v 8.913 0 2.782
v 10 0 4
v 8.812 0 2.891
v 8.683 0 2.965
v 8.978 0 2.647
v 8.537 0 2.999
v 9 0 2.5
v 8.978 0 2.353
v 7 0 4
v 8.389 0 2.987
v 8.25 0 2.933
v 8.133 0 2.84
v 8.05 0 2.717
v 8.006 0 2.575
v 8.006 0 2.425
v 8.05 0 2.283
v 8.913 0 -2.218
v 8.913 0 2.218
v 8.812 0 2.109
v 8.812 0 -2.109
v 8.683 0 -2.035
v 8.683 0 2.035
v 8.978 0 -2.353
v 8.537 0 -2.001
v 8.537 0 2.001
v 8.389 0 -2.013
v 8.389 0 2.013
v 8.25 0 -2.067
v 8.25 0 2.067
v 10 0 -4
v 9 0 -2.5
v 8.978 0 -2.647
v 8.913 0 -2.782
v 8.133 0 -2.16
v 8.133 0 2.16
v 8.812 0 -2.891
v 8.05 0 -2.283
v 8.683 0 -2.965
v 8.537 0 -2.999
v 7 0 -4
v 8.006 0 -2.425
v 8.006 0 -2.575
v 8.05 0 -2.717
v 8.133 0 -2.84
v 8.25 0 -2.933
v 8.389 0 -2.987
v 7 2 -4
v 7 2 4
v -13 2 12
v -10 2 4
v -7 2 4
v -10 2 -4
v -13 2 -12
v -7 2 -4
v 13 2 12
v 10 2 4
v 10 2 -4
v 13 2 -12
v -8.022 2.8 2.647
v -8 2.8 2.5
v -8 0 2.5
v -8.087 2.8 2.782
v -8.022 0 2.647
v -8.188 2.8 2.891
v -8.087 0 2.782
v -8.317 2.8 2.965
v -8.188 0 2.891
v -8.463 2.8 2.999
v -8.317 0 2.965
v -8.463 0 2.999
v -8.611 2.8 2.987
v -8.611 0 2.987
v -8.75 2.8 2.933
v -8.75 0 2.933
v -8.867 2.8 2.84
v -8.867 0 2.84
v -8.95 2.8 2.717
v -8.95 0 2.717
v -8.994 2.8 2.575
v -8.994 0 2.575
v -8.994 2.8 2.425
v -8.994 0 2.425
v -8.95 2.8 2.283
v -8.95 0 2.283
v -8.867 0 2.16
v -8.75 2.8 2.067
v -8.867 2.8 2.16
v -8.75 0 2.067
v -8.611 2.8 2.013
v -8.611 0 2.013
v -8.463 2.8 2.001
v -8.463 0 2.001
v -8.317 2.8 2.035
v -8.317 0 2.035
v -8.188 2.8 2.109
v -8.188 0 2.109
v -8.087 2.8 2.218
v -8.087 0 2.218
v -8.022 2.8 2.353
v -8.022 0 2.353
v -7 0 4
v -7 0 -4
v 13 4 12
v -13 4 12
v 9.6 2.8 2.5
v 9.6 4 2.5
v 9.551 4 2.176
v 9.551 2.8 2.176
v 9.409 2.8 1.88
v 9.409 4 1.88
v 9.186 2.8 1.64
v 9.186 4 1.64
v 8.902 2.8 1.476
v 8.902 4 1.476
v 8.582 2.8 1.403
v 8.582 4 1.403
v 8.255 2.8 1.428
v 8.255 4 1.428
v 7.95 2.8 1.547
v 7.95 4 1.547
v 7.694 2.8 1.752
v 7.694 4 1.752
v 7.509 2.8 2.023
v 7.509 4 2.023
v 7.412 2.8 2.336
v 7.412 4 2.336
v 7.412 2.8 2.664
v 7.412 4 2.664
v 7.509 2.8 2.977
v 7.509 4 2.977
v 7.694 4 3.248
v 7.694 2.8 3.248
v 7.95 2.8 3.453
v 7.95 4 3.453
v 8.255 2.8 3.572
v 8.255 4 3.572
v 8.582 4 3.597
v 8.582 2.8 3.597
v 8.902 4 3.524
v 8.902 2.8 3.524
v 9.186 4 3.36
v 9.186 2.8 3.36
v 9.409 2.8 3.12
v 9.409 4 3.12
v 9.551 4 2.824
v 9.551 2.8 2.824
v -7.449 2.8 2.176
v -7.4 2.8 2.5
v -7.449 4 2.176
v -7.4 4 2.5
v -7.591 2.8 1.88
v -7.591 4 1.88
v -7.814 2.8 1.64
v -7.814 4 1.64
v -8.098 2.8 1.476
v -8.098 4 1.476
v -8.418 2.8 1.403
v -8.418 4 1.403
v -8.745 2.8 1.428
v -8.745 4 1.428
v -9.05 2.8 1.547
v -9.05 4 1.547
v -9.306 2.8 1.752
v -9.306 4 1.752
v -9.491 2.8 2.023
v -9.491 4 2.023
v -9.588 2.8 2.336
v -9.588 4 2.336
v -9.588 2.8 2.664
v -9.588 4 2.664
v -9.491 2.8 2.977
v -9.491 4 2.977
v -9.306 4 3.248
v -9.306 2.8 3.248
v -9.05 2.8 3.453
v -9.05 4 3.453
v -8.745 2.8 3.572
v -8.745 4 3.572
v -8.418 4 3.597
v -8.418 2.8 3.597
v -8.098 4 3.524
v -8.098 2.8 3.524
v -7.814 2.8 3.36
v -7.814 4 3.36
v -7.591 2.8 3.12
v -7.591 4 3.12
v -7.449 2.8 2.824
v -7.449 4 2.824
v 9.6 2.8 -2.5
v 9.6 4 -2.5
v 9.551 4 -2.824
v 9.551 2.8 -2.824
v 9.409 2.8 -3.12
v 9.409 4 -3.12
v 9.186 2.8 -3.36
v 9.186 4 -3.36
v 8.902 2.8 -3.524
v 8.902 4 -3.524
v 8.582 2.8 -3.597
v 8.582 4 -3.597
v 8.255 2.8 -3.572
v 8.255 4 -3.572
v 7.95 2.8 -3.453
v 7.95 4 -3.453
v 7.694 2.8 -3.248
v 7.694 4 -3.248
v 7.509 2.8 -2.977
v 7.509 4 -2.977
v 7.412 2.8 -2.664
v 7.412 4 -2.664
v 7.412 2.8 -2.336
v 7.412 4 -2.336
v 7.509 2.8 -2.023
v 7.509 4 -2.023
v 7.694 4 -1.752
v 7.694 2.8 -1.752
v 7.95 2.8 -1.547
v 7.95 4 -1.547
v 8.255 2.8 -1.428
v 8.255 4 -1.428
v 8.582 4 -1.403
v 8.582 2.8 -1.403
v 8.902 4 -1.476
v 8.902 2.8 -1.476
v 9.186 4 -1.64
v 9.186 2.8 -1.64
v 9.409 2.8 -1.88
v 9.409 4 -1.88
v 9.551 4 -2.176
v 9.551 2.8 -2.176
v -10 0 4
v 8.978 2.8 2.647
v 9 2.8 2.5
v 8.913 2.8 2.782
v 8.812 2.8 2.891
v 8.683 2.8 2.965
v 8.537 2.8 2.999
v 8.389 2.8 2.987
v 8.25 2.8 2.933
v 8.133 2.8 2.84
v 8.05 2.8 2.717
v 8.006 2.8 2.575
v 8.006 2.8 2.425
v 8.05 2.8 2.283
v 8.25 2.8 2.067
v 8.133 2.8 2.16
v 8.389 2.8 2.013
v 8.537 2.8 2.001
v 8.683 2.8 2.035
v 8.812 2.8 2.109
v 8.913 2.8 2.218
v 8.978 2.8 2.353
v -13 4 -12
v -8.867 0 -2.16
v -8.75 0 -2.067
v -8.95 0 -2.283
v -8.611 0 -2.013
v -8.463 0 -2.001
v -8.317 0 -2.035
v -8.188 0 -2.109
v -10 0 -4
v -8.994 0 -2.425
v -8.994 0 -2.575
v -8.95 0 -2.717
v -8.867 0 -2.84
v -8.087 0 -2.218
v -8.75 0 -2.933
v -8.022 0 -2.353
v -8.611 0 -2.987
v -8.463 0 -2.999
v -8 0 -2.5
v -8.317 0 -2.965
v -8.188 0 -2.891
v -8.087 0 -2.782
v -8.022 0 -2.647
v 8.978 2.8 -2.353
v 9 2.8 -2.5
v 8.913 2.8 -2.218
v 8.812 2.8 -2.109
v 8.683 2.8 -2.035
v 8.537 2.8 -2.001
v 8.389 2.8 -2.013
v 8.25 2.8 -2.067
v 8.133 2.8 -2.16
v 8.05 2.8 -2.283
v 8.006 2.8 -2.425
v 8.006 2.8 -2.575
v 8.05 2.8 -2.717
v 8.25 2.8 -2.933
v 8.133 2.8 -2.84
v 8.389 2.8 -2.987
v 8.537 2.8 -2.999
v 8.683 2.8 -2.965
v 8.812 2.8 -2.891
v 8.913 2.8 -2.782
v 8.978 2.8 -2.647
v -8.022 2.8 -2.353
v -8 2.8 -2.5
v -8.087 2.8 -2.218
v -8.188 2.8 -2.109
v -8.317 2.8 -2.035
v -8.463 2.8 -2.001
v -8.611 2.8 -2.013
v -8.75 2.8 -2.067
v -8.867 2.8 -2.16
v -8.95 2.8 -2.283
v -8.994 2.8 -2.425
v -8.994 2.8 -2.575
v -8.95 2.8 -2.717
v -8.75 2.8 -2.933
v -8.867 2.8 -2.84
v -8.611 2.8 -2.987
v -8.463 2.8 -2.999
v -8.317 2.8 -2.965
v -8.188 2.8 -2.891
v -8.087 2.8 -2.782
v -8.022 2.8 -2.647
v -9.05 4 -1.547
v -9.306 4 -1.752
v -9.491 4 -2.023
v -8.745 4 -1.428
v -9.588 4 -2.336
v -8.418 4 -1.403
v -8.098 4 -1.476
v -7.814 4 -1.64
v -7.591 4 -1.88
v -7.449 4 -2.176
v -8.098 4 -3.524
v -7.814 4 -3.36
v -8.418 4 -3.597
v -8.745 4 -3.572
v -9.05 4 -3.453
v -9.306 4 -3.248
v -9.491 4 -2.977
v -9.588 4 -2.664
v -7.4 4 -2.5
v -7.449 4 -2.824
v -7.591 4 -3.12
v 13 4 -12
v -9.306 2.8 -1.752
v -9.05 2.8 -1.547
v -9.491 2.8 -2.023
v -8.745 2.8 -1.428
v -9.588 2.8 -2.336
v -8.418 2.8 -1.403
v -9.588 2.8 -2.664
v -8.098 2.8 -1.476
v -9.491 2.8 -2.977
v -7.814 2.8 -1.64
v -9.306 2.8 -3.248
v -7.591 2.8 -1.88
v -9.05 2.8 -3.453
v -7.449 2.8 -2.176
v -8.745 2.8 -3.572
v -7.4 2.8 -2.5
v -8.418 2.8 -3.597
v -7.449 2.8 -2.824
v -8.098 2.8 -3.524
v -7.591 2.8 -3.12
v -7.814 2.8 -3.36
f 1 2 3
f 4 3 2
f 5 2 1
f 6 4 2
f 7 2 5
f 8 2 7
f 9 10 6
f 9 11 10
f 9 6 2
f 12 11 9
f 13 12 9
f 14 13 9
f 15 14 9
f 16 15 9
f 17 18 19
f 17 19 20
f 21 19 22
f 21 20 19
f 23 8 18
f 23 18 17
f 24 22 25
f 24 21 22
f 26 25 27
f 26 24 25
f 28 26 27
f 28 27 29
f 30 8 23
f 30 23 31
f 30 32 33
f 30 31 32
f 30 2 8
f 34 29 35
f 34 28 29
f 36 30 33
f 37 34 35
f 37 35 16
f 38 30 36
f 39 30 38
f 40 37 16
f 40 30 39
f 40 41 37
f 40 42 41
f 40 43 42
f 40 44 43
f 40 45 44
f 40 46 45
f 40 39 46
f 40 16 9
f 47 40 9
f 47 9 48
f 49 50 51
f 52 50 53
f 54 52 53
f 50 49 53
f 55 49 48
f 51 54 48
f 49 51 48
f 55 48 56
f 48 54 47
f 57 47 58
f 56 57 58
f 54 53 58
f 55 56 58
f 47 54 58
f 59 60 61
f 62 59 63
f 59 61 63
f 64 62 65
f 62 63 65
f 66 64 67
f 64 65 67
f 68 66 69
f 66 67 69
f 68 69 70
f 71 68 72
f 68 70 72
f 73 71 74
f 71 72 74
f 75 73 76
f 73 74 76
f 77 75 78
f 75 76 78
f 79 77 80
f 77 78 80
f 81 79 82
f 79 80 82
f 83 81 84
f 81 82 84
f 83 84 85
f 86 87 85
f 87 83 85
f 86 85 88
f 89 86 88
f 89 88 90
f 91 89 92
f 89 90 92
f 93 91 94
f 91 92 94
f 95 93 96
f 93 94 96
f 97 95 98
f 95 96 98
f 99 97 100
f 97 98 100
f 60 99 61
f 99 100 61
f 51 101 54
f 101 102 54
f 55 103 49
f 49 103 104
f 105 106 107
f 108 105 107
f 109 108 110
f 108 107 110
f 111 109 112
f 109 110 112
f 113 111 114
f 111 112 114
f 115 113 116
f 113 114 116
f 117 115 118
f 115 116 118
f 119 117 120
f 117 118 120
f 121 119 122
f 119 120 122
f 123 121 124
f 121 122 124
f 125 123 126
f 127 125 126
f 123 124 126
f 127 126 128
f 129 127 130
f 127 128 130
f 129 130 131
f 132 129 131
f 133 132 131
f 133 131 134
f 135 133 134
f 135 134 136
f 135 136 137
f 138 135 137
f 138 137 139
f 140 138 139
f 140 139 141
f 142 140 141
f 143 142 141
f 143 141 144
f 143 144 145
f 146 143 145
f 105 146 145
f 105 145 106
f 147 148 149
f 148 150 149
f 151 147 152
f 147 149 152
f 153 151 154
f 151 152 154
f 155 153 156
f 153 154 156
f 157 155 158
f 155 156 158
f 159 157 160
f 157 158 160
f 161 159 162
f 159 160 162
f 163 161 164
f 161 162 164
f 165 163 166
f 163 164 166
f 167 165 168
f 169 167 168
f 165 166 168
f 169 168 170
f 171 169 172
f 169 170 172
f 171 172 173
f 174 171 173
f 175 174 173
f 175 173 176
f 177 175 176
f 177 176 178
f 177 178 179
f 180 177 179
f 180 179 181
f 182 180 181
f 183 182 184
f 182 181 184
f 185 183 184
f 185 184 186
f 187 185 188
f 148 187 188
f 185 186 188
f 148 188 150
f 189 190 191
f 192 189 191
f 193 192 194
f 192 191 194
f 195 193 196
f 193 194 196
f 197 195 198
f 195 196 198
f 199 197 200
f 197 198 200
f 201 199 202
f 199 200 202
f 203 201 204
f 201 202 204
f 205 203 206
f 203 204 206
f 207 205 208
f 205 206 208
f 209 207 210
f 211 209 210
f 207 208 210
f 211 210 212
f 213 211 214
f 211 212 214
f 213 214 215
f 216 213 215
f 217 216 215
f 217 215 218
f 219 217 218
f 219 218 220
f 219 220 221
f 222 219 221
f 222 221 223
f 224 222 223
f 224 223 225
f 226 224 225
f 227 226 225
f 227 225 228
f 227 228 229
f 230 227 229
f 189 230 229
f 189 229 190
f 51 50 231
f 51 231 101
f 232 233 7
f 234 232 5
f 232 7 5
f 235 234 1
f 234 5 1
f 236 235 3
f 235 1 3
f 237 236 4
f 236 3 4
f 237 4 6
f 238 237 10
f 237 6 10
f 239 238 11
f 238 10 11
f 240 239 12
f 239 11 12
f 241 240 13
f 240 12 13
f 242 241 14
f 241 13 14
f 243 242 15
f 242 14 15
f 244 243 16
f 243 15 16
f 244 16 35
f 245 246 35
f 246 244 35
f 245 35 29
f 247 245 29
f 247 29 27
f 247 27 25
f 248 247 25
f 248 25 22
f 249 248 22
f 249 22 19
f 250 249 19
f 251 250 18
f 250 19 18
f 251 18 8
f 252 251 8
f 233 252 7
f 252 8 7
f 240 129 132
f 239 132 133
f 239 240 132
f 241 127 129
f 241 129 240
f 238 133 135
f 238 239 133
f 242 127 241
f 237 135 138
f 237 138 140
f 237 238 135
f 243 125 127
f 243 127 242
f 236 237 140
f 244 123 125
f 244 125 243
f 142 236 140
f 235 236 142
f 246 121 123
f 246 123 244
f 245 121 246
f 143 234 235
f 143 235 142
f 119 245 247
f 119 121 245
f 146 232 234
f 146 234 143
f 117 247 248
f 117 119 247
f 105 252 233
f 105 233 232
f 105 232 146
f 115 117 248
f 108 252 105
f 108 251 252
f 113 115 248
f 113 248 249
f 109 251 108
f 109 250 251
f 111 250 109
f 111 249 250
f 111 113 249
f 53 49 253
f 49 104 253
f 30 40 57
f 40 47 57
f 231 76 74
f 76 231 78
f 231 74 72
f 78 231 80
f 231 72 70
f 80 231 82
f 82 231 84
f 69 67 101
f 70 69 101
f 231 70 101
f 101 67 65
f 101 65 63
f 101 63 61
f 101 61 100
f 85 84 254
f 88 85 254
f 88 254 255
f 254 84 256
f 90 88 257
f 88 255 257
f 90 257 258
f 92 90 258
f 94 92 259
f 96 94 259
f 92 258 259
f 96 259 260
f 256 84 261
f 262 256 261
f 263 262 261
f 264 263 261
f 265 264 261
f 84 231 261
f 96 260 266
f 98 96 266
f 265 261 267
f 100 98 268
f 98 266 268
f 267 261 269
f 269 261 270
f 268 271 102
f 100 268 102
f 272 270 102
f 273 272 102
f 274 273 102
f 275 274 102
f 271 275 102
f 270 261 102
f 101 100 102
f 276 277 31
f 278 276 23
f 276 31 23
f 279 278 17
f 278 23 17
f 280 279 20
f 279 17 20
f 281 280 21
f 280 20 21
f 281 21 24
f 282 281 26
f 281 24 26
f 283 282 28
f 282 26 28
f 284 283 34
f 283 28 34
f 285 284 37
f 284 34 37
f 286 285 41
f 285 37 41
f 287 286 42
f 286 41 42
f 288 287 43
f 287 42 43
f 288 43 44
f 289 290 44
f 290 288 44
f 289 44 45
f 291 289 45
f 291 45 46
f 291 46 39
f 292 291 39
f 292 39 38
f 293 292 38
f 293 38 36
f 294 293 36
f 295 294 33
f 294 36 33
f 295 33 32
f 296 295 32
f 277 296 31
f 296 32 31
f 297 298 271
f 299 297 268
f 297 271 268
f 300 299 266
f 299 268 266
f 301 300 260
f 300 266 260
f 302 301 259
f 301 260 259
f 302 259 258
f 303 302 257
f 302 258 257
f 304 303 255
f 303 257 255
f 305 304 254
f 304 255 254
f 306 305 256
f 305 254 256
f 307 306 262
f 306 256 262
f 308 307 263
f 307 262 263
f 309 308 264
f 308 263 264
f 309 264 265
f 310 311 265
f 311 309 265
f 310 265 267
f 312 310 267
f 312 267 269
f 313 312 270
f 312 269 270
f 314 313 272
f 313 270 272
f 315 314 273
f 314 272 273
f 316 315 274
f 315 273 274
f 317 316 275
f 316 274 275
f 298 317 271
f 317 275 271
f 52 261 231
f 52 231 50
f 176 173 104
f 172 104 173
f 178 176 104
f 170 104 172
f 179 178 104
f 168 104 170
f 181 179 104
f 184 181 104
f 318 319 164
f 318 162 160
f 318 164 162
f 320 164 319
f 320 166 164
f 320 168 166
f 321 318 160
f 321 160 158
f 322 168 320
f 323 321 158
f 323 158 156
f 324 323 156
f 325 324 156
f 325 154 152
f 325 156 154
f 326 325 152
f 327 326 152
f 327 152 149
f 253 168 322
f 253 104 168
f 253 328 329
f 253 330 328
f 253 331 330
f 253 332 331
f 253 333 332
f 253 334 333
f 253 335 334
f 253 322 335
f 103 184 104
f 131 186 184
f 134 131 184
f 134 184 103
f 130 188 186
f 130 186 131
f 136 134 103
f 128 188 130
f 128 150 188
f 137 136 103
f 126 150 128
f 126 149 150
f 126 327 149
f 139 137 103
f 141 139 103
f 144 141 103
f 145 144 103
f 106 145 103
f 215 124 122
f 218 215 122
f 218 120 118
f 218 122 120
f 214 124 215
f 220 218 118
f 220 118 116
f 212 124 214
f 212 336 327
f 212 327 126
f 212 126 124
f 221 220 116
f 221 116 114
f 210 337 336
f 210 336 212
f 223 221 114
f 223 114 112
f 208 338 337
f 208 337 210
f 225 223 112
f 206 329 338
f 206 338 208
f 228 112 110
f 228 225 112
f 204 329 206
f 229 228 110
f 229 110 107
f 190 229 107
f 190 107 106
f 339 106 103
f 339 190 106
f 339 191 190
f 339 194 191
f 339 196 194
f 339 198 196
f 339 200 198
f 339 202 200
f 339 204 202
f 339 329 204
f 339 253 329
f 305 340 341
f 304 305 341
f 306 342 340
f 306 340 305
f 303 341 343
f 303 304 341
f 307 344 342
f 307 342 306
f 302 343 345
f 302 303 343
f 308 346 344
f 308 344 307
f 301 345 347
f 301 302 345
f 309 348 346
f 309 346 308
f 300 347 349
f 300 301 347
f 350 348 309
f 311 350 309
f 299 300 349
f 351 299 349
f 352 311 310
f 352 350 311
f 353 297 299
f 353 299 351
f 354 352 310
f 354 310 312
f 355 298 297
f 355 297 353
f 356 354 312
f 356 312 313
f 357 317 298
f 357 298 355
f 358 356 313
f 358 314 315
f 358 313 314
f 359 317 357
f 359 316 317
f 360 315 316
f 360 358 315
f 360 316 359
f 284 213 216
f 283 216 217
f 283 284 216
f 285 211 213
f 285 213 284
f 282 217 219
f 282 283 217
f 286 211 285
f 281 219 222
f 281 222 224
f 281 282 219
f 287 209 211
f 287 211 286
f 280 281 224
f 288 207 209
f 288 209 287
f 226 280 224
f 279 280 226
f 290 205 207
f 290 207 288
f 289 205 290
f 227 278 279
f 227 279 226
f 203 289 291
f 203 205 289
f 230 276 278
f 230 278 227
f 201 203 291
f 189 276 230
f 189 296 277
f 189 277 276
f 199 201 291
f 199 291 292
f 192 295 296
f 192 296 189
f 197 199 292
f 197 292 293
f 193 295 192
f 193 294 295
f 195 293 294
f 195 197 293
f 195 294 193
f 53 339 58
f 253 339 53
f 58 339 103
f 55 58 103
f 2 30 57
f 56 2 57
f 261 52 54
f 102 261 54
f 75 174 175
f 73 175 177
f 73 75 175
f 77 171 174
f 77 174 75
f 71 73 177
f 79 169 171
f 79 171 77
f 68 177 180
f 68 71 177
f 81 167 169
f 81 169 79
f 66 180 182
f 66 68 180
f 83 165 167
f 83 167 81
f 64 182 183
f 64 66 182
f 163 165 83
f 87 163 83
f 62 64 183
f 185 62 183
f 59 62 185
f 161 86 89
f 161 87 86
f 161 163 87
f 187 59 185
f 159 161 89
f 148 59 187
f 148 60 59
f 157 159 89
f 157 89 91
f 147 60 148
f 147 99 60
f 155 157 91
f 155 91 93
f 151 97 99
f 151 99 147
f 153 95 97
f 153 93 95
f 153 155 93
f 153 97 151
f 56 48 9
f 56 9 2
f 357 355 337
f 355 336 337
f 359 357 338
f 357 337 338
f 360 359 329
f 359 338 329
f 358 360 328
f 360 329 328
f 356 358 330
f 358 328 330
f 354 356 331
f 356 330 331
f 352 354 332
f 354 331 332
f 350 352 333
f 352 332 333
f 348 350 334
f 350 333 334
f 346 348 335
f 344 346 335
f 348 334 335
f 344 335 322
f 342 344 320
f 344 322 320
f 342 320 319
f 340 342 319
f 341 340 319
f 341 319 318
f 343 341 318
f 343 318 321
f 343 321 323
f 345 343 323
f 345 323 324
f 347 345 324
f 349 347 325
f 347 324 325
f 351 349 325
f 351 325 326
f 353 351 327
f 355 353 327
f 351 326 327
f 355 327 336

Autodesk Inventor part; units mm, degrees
ref_plane "YZ Plane" through (0, 0, 0) normal (1, 0, 0) x (0, 1, 0)
ref_plane "XZ Plane" through (0, 0, 0) normal (0, 1, 0) x (-1, 0, 0)
ref_plane "XY Plane" through (0, 0, 0) normal (0, 0, 1) x (1, 0, 0)
sketch "Sketch1" plane through (0, 0, 0) normal (0, 0, 1) x (1, 0, 0)
  line L0 (0, 0) -> (10, 0) construction
  line L1 (0, 0) -> (0, 21.2479) construction
  line L2 (10, 0) -> (7, 0)
  line L3 (7, 0) -> (7, 2)
  line L4 (7, 2) -> (0, 2)
  line L5 (10, 0) -> (10, 2)
  line L6 (10, 2) -> (13, 2)
  line L7 (13, 2) -> (13, 4)
  line L8 (13, 4) -> (0, 4)
  line L9 (-7, 0) -> (-7, 2)
  line L10 (-7, 2) -> (0, 2)
  line L11 (-10, 0) -> (-10, 2)
  line L12 (-10, 2) -> (-13, 2)
  line L13 (-13, 2) -> (-13, 4)
  line L14 (-13, 4) -> (0, 4)
  line L15 (-10, 0) -> (-7, 0)
  line L16 (7, 0) -> (10, 0)
  dimension "d0" = 10
  dimension "d1" = 3
  dimension "d2" = 2
  dimension "d3" = 2
  dimension "d4" = 3
  dimension "d5" = 2
extrude "Extrusion1" add sketch "Sketch1" along normal mid plane 8
sketch "Sketch2" plane through (-10, 0, 4) normal (0, -1, 0) x (1, 0, 0)
  line L0 (3, -8) -> (3, 0) projected
  line L1 (17, -8.5525) -> (20, -8.5525) construction
  line L2 (20, 0.5525) -> (17, 0.5525) construction
  line L3 (0, 0) -> (0, -8) construction
  line L4 (0, -8) -> (3, -8) construction
  line L5 (3, -8) -> (3, 0) construction
  line L6 (3, 0) -> (0, 0) construction
  line L7 (1.5, 0) -> (1.5, -8) construction
  line L8 (18.5, 0.5525) -> (18.5, -8.5525) construction
  line L9 (1.5, -4) -> (18.5, -4) construction
  circle A0 centre (1.5, -1.5) radius 0.5
  line L10 (10, -4) -> (10, 0.5233) construction
  line L11 (18.5, -8.5525) -> (18.5, 0.5525) construction
  circle A1 centre (1.5, -6.5) radius 0.5
  circle A2 centre (18.5, -1.5) radius 0.5
  circle A3 centre (18.5, -6.5) radius 0.5
  line L12 (20, 0) -> (17, 0) projected
  line L13 (17, -8) -> (17, 0) projected
  line L14 (17, -8) -> (20, -8) projected
  line L15 (20, 0) -> (20, -8) projected
  line L16 (3, -4) -> (17, -4) construction
  line L17 (10, -4) -> (10, -13.0103) construction
  dimension "d8" = 1
  dimension "d9" = 2.5
  dimension "d10" = 0
  dimension "d11" = 0
  dimension "d12" = 8.5
extrude "Extrusion2" cut sketch "Sketch2" against normal through all contours A0 | A1 | A2 | A3
sketch "Sketch3" plane through (-13, 4, 4) normal (0, 1, 0) x (1, 0, 0)
  circle A0 centre (21.5, 6.5) radius 0.5 projected
  circle A1 centre (21.5, 1.5) radius 0.5 projected
  circle A2 centre (4.5, 6.5) radius 0.5 projected
  circle A3 centre (4.5, 1.5) radius 0.5 projected
  circle A4 centre (4.5, 6.5) radius 1.1
  circle A5 centre (4.5, 1.5) radius 1.1
  circle A6 centre (21.5, 6.5) radius 1.1
  circle A7 centre (21.5, 1.5) radius 1.1
  dimension "d15" = 2.2
extrude "Extrusion3" cut sketch "Sketch3" against normal blind 1.2
sketch "Sketch4" plane through (-13, 4, 4) normal (0, 1, 0) x (1, 0, 0)
  line L0 (0, 8) -> (0, 0) projected
  line L1 (0, 8) -> (26, 8)
  line L2 (26, 8) -> (26, 16)
  line L3 (26, 16) -> (0, 16)
  line L4 (0, 16) -> (0, 8)
  line L5 (0, 0) -> (26, 0)
  line L6 (26, 0) -> (26, -8)
  line L7 (26, -8) -> (0, -8)
  line L8 (0, -8) -> (0, 0)
extrude "Extrusion4" add sketch "Sketch4" against normal up to surface (2 mm away)
properties part number "Table"
